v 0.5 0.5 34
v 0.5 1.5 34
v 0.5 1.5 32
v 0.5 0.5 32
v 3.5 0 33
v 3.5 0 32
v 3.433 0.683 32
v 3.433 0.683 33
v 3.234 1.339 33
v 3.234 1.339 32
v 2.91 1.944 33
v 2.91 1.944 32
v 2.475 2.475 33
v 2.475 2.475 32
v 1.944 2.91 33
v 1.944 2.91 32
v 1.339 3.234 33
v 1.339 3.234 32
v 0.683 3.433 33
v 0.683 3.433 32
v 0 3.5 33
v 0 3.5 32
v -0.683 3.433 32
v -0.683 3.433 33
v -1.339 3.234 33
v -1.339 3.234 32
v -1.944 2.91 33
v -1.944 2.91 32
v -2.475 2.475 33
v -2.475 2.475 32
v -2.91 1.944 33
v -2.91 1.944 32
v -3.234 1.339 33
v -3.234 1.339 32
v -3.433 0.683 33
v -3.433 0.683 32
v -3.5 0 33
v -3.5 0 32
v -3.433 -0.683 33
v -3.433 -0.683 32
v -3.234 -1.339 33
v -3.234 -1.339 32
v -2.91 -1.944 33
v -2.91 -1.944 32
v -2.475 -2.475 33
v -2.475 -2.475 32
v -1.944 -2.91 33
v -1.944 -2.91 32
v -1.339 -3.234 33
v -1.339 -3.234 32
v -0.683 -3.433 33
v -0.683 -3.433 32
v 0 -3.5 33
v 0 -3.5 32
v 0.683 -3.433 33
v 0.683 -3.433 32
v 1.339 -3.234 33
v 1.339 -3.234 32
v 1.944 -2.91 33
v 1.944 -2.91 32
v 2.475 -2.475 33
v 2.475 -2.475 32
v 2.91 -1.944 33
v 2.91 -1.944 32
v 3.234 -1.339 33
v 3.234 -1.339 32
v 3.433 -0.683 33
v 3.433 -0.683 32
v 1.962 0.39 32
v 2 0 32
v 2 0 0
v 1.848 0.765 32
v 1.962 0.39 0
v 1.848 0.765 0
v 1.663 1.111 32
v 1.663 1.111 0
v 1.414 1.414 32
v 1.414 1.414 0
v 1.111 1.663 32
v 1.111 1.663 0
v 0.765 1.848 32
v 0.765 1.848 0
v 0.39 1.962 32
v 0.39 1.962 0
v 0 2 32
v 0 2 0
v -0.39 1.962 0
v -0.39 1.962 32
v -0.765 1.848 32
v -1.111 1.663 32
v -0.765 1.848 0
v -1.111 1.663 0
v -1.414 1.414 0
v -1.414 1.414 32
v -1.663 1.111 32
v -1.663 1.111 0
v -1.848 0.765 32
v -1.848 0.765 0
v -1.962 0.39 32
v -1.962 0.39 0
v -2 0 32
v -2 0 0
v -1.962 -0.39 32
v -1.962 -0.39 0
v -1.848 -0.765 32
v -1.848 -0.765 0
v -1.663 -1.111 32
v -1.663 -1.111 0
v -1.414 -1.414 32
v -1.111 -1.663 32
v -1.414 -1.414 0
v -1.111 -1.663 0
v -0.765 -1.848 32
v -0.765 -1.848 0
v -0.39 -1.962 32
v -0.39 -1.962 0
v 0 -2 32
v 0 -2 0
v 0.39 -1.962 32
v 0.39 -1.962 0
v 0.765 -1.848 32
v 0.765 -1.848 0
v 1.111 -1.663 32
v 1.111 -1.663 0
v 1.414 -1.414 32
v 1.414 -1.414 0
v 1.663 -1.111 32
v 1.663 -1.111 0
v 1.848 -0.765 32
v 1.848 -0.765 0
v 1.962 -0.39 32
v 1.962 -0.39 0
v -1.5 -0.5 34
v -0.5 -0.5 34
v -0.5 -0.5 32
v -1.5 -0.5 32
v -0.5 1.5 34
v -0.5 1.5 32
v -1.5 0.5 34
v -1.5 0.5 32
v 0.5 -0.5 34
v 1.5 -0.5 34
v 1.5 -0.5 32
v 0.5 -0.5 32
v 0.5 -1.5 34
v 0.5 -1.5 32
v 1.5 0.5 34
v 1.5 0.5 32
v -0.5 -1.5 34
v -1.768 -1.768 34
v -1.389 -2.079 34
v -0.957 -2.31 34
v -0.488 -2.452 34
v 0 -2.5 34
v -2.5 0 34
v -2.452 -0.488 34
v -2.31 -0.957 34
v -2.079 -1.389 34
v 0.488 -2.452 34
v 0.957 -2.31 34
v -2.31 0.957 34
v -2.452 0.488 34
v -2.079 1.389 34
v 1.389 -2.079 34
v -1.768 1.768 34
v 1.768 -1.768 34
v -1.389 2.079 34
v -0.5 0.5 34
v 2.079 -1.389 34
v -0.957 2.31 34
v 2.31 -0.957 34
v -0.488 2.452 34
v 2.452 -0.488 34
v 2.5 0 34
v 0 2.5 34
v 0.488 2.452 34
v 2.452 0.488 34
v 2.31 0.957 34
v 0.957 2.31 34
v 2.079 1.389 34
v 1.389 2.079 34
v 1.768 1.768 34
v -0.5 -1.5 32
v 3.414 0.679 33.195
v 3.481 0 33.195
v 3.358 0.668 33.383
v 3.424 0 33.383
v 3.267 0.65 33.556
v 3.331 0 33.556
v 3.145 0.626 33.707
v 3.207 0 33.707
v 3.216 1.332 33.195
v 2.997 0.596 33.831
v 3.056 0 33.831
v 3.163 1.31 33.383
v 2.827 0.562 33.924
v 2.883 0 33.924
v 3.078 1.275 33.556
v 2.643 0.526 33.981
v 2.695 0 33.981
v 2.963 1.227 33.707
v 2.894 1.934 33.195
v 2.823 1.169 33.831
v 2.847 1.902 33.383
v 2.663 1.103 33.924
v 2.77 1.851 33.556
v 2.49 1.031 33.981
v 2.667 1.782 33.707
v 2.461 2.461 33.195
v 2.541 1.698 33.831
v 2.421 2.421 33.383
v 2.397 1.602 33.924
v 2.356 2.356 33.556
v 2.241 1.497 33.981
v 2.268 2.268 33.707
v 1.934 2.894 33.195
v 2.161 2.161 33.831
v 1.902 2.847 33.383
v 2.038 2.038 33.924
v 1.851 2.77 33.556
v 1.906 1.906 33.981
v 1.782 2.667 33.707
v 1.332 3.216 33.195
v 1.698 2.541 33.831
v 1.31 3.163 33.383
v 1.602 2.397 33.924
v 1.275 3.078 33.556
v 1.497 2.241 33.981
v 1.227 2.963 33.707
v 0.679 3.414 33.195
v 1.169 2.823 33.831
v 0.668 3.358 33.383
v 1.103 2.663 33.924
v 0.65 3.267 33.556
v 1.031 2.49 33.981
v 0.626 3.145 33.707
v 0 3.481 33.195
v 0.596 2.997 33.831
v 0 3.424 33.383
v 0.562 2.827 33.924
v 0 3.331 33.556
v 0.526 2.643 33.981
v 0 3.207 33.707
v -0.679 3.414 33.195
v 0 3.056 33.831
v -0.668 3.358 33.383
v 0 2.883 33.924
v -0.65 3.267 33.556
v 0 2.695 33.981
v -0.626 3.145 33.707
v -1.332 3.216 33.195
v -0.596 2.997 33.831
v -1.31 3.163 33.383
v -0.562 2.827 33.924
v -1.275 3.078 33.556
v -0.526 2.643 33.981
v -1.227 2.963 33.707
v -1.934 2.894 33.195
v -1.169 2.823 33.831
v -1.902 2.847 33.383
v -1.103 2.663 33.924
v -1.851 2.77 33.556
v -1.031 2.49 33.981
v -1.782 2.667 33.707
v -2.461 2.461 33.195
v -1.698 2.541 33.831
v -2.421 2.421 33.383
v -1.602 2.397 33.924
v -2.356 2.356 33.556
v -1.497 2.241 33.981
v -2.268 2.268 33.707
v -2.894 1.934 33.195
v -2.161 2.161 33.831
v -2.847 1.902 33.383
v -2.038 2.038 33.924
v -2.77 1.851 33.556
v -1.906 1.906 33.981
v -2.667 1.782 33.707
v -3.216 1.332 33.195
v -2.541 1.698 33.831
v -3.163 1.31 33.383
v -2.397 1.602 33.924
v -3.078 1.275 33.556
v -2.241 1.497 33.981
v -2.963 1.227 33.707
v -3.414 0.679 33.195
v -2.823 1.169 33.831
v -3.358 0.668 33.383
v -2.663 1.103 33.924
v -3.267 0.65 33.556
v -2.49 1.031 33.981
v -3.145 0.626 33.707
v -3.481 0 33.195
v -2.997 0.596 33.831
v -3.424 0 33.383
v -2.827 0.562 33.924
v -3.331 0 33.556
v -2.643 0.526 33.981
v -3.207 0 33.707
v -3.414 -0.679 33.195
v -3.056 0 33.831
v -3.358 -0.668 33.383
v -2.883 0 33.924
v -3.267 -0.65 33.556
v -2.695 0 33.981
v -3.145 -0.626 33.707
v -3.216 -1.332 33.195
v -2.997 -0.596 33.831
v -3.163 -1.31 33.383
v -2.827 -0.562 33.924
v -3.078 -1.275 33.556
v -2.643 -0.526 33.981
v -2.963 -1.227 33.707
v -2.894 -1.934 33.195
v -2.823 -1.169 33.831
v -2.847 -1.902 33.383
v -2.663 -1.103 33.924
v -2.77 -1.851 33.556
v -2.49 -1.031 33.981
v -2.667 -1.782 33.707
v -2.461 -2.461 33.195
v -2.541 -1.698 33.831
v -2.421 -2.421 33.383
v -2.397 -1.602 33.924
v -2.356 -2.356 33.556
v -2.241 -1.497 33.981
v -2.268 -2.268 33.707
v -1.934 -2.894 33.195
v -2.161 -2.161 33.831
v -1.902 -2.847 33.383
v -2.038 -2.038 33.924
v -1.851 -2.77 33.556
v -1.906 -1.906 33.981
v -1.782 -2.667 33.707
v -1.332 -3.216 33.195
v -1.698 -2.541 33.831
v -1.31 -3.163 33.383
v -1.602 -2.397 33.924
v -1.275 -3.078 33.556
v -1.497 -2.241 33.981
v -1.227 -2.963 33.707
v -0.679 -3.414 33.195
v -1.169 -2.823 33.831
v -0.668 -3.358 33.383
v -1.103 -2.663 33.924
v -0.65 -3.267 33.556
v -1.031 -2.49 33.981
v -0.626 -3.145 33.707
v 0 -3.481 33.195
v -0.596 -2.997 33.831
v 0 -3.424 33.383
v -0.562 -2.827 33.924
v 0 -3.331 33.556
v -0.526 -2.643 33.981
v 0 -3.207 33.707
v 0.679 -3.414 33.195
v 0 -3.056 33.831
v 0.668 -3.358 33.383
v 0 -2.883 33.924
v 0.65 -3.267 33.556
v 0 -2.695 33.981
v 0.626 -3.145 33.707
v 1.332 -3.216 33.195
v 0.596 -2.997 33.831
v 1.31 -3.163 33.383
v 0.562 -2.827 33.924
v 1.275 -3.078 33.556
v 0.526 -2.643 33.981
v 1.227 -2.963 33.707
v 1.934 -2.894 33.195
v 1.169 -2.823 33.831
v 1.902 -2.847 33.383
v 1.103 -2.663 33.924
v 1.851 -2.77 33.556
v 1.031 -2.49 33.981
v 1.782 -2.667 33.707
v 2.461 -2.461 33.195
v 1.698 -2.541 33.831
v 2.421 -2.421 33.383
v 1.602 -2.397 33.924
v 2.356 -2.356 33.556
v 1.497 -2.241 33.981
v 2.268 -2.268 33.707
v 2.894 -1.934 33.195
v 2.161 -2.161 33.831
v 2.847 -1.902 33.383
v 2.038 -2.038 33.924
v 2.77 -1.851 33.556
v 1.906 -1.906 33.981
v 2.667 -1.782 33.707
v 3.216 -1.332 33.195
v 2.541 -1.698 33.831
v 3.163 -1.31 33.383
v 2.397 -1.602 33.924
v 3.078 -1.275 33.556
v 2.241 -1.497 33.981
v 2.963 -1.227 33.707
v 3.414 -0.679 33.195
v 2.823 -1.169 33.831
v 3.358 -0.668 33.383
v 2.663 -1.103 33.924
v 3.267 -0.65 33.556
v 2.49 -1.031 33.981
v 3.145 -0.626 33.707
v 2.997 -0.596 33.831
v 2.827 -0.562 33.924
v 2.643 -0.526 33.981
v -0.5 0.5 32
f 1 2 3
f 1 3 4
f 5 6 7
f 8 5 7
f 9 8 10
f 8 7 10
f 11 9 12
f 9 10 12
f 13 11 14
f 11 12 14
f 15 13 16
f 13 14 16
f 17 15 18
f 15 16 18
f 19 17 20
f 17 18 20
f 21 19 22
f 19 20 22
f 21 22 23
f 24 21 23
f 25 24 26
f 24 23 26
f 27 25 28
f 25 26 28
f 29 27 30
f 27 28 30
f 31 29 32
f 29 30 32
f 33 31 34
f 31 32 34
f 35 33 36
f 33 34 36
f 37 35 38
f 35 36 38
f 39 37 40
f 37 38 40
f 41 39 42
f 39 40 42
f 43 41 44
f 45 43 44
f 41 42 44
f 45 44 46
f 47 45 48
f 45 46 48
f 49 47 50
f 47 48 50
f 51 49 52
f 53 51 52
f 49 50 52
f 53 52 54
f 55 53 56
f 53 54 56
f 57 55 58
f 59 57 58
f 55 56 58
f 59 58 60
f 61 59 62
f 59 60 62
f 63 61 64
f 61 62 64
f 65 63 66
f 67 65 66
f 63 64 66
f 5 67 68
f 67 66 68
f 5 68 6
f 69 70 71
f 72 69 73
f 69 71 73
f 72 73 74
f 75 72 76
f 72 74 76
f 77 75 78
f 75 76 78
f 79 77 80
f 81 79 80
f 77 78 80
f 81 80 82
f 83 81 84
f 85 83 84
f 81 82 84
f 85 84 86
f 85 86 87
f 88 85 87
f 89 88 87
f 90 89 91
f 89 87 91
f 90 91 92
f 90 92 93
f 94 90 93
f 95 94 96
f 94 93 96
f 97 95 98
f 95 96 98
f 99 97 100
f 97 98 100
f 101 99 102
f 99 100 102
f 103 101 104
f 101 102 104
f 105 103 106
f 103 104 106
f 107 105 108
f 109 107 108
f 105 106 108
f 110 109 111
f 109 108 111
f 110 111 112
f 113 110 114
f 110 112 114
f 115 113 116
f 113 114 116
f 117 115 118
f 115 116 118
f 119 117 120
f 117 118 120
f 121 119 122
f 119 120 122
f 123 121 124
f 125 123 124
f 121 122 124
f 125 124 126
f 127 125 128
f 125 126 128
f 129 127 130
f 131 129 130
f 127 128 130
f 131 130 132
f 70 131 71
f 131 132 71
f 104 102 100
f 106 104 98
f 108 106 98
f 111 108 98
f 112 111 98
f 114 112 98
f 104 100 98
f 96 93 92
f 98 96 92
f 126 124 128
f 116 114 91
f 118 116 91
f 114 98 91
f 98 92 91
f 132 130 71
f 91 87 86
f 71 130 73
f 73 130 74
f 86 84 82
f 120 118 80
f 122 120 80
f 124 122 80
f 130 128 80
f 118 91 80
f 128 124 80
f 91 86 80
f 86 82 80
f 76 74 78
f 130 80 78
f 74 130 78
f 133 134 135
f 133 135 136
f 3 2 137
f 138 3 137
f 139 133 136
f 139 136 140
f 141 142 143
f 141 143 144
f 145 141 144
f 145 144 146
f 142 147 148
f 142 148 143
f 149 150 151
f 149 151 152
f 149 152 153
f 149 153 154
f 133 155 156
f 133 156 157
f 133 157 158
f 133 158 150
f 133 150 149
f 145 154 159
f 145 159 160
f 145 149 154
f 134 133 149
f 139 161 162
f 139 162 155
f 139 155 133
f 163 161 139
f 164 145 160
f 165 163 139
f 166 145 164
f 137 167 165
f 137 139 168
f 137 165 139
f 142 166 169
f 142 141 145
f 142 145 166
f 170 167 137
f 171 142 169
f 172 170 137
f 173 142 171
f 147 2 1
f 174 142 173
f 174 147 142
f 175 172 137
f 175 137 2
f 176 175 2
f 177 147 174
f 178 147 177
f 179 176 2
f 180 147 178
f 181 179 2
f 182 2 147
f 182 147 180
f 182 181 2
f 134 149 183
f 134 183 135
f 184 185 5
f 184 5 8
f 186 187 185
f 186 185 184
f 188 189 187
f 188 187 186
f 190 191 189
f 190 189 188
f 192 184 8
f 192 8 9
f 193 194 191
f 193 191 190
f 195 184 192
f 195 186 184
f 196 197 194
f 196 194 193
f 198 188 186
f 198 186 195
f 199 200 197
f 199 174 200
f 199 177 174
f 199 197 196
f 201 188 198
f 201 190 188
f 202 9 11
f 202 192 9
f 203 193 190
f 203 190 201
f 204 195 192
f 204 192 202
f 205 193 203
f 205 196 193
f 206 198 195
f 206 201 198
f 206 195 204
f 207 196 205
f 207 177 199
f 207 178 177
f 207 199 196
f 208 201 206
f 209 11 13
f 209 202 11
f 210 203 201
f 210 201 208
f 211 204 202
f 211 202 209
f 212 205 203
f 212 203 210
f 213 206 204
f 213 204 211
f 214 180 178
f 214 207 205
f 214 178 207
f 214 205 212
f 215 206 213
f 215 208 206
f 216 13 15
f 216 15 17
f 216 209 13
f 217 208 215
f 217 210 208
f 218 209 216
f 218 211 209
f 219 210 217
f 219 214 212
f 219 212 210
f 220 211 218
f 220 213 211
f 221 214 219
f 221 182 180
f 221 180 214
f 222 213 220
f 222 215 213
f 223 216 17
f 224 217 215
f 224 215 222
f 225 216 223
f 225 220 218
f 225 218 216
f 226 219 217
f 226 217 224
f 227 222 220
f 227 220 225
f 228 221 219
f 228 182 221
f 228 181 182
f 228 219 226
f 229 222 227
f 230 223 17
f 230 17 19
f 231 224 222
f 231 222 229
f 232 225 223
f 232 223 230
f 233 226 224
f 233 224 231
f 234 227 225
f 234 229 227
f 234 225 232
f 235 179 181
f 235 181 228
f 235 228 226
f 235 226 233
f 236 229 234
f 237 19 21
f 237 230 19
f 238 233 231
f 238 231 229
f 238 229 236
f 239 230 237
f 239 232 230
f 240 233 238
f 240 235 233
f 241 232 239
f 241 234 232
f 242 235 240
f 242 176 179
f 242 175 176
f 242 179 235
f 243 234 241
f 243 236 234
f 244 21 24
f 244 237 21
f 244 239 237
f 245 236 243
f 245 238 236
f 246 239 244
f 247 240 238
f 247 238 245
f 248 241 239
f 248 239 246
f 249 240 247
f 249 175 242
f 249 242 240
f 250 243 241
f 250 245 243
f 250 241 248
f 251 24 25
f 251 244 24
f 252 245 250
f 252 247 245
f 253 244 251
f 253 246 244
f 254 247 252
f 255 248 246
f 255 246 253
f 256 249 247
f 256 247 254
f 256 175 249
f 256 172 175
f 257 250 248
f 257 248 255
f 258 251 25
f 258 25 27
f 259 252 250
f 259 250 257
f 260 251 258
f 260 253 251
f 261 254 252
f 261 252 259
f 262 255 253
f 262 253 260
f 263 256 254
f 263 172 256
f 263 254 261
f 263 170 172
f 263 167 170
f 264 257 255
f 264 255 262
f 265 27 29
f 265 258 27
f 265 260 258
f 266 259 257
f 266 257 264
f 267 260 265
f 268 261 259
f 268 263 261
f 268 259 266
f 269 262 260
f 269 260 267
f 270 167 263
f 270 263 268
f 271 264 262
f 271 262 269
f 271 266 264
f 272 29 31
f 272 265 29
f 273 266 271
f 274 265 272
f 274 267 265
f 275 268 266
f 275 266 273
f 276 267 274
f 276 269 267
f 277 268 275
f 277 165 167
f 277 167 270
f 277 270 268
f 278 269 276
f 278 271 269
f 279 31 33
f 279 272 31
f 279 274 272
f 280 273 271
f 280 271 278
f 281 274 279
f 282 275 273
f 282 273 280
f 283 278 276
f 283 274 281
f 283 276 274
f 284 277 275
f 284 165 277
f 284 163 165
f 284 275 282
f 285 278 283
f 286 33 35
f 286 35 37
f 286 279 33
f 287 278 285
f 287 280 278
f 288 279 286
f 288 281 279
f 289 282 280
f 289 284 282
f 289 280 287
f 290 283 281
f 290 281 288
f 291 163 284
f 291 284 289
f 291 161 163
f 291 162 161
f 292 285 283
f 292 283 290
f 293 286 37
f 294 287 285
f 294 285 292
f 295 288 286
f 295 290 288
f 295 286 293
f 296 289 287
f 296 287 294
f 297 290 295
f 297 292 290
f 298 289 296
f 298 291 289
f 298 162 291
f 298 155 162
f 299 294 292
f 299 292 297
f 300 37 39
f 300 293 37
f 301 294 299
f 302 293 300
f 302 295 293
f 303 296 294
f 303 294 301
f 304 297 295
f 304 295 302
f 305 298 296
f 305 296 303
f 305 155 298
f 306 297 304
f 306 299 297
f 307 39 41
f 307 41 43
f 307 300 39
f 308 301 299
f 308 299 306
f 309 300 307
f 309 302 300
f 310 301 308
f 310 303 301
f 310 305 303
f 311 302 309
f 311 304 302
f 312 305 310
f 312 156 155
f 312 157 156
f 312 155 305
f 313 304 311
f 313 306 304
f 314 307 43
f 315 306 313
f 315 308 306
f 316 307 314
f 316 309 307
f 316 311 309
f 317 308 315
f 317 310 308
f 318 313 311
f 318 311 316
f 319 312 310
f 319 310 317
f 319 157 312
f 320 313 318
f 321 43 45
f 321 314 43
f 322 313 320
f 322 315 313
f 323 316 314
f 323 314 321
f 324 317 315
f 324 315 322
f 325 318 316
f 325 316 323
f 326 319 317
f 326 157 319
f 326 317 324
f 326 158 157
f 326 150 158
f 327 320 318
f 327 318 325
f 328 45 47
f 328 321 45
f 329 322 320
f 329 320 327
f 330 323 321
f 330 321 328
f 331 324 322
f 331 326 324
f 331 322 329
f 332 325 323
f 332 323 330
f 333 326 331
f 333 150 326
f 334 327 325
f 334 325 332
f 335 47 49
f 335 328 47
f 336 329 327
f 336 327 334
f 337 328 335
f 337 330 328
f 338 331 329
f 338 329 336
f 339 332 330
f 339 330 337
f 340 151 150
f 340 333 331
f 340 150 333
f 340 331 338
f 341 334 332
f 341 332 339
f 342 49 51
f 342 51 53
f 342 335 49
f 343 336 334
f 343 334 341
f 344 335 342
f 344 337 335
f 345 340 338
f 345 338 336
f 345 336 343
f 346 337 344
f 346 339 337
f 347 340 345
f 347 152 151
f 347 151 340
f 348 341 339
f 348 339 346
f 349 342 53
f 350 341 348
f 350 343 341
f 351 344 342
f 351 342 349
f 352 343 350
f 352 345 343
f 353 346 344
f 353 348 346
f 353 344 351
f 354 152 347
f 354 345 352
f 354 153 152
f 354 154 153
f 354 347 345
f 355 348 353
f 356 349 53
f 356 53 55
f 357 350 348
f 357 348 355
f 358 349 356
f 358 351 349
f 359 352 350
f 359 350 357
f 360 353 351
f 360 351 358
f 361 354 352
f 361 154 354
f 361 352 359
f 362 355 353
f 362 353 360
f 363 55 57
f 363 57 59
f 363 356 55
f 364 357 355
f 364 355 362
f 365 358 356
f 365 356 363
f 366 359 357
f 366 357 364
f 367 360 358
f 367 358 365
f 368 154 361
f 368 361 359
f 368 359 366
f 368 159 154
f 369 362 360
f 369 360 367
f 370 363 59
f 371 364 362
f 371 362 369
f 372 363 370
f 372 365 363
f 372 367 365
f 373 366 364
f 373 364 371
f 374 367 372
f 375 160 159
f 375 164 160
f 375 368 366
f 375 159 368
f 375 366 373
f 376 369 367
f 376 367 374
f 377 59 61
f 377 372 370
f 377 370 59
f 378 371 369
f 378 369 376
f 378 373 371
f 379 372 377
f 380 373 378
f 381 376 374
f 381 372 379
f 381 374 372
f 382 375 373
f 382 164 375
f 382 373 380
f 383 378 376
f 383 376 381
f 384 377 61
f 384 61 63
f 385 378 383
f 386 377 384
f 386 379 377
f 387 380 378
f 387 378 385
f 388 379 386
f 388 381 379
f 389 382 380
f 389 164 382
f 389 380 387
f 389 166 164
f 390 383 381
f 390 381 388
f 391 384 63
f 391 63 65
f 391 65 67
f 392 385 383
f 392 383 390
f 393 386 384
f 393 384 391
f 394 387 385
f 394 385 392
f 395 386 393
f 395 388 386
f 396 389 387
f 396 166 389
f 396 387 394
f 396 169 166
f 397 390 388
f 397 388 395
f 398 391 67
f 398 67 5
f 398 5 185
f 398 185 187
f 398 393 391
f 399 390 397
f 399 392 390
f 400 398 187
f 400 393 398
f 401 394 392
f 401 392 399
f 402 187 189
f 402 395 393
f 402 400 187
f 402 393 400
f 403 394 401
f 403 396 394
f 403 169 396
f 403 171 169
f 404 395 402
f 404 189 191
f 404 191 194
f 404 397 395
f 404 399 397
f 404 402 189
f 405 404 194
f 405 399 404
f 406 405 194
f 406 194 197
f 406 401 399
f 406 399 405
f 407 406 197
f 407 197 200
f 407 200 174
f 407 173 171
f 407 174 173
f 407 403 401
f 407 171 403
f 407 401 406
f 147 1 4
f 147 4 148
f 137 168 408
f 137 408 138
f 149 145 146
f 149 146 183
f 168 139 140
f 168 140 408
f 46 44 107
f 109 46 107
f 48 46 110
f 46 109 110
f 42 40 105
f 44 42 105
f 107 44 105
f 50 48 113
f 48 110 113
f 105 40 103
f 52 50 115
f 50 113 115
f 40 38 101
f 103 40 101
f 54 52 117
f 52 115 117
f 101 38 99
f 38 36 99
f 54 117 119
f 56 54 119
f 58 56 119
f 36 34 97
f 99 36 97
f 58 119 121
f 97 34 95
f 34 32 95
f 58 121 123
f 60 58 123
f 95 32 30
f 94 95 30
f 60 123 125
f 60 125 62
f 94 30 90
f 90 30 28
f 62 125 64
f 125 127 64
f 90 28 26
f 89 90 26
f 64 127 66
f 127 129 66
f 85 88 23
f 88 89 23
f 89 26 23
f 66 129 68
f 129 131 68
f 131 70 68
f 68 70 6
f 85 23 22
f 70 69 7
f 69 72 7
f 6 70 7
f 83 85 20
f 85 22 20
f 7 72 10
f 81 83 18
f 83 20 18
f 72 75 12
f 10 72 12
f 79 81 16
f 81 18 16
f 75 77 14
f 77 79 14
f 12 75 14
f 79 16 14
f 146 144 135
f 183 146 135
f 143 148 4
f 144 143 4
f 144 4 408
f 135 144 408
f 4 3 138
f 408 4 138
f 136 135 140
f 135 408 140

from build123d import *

# Parameters (mm, degrees)
SKETCH_1_R          = 2
EXTRUDE_1_DEPTH     = 32
SKETCH_2_R          = 3.5
EXTRUDE_2_DEPTH     = 2
FILLET_1_R          = 1
CUT_EXTRUDE_1_DEPTH = 2


with BuildPart() as part:
    # 草图1 → 凸台-拉伸1 (new body)
    with BuildSketch(Plane.XY):
        Circle(SKETCH_1_R)
    extrude(amount=EXTRUDE_1_DEPTH)

    # 草图2 → 凸台-拉伸2 (add)
    with BuildSketch(Plane.XY.offset(32)):
        Circle(SKETCH_2_R)
    extrude(amount=EXTRUDE_2_DEPTH)

    # 圆角1
    fillet_1_edges = [part.edges().sort_by_distance(p)[0] for p in [
        (-3.5, 0, 34),
    ]]
    fillet(fillet_1_edges, radius=FILLET_1_R)

    # 草图3 → 切除-拉伸1 (cut)
    with BuildSketch(Plane.XY.offset(34)):
        Polygon((0, 1.5), (0.5, 1.5), (0.5, 0.5), (1.5, 0.5), (1.5, -0.5), (0.5, -0.5), (0.5, -1.5), (-0.5, -1.5), (-0.5, -0.5), (-1.5, -0.5), (-1.5, 0.5), (-0.5, 0.5), (-0.5, 1.5), align=None)
    extrude(amount=-CUT_EXTRUDE_1_DEPTH, mode=Mode.SUBTRACT)


solid = part.part
